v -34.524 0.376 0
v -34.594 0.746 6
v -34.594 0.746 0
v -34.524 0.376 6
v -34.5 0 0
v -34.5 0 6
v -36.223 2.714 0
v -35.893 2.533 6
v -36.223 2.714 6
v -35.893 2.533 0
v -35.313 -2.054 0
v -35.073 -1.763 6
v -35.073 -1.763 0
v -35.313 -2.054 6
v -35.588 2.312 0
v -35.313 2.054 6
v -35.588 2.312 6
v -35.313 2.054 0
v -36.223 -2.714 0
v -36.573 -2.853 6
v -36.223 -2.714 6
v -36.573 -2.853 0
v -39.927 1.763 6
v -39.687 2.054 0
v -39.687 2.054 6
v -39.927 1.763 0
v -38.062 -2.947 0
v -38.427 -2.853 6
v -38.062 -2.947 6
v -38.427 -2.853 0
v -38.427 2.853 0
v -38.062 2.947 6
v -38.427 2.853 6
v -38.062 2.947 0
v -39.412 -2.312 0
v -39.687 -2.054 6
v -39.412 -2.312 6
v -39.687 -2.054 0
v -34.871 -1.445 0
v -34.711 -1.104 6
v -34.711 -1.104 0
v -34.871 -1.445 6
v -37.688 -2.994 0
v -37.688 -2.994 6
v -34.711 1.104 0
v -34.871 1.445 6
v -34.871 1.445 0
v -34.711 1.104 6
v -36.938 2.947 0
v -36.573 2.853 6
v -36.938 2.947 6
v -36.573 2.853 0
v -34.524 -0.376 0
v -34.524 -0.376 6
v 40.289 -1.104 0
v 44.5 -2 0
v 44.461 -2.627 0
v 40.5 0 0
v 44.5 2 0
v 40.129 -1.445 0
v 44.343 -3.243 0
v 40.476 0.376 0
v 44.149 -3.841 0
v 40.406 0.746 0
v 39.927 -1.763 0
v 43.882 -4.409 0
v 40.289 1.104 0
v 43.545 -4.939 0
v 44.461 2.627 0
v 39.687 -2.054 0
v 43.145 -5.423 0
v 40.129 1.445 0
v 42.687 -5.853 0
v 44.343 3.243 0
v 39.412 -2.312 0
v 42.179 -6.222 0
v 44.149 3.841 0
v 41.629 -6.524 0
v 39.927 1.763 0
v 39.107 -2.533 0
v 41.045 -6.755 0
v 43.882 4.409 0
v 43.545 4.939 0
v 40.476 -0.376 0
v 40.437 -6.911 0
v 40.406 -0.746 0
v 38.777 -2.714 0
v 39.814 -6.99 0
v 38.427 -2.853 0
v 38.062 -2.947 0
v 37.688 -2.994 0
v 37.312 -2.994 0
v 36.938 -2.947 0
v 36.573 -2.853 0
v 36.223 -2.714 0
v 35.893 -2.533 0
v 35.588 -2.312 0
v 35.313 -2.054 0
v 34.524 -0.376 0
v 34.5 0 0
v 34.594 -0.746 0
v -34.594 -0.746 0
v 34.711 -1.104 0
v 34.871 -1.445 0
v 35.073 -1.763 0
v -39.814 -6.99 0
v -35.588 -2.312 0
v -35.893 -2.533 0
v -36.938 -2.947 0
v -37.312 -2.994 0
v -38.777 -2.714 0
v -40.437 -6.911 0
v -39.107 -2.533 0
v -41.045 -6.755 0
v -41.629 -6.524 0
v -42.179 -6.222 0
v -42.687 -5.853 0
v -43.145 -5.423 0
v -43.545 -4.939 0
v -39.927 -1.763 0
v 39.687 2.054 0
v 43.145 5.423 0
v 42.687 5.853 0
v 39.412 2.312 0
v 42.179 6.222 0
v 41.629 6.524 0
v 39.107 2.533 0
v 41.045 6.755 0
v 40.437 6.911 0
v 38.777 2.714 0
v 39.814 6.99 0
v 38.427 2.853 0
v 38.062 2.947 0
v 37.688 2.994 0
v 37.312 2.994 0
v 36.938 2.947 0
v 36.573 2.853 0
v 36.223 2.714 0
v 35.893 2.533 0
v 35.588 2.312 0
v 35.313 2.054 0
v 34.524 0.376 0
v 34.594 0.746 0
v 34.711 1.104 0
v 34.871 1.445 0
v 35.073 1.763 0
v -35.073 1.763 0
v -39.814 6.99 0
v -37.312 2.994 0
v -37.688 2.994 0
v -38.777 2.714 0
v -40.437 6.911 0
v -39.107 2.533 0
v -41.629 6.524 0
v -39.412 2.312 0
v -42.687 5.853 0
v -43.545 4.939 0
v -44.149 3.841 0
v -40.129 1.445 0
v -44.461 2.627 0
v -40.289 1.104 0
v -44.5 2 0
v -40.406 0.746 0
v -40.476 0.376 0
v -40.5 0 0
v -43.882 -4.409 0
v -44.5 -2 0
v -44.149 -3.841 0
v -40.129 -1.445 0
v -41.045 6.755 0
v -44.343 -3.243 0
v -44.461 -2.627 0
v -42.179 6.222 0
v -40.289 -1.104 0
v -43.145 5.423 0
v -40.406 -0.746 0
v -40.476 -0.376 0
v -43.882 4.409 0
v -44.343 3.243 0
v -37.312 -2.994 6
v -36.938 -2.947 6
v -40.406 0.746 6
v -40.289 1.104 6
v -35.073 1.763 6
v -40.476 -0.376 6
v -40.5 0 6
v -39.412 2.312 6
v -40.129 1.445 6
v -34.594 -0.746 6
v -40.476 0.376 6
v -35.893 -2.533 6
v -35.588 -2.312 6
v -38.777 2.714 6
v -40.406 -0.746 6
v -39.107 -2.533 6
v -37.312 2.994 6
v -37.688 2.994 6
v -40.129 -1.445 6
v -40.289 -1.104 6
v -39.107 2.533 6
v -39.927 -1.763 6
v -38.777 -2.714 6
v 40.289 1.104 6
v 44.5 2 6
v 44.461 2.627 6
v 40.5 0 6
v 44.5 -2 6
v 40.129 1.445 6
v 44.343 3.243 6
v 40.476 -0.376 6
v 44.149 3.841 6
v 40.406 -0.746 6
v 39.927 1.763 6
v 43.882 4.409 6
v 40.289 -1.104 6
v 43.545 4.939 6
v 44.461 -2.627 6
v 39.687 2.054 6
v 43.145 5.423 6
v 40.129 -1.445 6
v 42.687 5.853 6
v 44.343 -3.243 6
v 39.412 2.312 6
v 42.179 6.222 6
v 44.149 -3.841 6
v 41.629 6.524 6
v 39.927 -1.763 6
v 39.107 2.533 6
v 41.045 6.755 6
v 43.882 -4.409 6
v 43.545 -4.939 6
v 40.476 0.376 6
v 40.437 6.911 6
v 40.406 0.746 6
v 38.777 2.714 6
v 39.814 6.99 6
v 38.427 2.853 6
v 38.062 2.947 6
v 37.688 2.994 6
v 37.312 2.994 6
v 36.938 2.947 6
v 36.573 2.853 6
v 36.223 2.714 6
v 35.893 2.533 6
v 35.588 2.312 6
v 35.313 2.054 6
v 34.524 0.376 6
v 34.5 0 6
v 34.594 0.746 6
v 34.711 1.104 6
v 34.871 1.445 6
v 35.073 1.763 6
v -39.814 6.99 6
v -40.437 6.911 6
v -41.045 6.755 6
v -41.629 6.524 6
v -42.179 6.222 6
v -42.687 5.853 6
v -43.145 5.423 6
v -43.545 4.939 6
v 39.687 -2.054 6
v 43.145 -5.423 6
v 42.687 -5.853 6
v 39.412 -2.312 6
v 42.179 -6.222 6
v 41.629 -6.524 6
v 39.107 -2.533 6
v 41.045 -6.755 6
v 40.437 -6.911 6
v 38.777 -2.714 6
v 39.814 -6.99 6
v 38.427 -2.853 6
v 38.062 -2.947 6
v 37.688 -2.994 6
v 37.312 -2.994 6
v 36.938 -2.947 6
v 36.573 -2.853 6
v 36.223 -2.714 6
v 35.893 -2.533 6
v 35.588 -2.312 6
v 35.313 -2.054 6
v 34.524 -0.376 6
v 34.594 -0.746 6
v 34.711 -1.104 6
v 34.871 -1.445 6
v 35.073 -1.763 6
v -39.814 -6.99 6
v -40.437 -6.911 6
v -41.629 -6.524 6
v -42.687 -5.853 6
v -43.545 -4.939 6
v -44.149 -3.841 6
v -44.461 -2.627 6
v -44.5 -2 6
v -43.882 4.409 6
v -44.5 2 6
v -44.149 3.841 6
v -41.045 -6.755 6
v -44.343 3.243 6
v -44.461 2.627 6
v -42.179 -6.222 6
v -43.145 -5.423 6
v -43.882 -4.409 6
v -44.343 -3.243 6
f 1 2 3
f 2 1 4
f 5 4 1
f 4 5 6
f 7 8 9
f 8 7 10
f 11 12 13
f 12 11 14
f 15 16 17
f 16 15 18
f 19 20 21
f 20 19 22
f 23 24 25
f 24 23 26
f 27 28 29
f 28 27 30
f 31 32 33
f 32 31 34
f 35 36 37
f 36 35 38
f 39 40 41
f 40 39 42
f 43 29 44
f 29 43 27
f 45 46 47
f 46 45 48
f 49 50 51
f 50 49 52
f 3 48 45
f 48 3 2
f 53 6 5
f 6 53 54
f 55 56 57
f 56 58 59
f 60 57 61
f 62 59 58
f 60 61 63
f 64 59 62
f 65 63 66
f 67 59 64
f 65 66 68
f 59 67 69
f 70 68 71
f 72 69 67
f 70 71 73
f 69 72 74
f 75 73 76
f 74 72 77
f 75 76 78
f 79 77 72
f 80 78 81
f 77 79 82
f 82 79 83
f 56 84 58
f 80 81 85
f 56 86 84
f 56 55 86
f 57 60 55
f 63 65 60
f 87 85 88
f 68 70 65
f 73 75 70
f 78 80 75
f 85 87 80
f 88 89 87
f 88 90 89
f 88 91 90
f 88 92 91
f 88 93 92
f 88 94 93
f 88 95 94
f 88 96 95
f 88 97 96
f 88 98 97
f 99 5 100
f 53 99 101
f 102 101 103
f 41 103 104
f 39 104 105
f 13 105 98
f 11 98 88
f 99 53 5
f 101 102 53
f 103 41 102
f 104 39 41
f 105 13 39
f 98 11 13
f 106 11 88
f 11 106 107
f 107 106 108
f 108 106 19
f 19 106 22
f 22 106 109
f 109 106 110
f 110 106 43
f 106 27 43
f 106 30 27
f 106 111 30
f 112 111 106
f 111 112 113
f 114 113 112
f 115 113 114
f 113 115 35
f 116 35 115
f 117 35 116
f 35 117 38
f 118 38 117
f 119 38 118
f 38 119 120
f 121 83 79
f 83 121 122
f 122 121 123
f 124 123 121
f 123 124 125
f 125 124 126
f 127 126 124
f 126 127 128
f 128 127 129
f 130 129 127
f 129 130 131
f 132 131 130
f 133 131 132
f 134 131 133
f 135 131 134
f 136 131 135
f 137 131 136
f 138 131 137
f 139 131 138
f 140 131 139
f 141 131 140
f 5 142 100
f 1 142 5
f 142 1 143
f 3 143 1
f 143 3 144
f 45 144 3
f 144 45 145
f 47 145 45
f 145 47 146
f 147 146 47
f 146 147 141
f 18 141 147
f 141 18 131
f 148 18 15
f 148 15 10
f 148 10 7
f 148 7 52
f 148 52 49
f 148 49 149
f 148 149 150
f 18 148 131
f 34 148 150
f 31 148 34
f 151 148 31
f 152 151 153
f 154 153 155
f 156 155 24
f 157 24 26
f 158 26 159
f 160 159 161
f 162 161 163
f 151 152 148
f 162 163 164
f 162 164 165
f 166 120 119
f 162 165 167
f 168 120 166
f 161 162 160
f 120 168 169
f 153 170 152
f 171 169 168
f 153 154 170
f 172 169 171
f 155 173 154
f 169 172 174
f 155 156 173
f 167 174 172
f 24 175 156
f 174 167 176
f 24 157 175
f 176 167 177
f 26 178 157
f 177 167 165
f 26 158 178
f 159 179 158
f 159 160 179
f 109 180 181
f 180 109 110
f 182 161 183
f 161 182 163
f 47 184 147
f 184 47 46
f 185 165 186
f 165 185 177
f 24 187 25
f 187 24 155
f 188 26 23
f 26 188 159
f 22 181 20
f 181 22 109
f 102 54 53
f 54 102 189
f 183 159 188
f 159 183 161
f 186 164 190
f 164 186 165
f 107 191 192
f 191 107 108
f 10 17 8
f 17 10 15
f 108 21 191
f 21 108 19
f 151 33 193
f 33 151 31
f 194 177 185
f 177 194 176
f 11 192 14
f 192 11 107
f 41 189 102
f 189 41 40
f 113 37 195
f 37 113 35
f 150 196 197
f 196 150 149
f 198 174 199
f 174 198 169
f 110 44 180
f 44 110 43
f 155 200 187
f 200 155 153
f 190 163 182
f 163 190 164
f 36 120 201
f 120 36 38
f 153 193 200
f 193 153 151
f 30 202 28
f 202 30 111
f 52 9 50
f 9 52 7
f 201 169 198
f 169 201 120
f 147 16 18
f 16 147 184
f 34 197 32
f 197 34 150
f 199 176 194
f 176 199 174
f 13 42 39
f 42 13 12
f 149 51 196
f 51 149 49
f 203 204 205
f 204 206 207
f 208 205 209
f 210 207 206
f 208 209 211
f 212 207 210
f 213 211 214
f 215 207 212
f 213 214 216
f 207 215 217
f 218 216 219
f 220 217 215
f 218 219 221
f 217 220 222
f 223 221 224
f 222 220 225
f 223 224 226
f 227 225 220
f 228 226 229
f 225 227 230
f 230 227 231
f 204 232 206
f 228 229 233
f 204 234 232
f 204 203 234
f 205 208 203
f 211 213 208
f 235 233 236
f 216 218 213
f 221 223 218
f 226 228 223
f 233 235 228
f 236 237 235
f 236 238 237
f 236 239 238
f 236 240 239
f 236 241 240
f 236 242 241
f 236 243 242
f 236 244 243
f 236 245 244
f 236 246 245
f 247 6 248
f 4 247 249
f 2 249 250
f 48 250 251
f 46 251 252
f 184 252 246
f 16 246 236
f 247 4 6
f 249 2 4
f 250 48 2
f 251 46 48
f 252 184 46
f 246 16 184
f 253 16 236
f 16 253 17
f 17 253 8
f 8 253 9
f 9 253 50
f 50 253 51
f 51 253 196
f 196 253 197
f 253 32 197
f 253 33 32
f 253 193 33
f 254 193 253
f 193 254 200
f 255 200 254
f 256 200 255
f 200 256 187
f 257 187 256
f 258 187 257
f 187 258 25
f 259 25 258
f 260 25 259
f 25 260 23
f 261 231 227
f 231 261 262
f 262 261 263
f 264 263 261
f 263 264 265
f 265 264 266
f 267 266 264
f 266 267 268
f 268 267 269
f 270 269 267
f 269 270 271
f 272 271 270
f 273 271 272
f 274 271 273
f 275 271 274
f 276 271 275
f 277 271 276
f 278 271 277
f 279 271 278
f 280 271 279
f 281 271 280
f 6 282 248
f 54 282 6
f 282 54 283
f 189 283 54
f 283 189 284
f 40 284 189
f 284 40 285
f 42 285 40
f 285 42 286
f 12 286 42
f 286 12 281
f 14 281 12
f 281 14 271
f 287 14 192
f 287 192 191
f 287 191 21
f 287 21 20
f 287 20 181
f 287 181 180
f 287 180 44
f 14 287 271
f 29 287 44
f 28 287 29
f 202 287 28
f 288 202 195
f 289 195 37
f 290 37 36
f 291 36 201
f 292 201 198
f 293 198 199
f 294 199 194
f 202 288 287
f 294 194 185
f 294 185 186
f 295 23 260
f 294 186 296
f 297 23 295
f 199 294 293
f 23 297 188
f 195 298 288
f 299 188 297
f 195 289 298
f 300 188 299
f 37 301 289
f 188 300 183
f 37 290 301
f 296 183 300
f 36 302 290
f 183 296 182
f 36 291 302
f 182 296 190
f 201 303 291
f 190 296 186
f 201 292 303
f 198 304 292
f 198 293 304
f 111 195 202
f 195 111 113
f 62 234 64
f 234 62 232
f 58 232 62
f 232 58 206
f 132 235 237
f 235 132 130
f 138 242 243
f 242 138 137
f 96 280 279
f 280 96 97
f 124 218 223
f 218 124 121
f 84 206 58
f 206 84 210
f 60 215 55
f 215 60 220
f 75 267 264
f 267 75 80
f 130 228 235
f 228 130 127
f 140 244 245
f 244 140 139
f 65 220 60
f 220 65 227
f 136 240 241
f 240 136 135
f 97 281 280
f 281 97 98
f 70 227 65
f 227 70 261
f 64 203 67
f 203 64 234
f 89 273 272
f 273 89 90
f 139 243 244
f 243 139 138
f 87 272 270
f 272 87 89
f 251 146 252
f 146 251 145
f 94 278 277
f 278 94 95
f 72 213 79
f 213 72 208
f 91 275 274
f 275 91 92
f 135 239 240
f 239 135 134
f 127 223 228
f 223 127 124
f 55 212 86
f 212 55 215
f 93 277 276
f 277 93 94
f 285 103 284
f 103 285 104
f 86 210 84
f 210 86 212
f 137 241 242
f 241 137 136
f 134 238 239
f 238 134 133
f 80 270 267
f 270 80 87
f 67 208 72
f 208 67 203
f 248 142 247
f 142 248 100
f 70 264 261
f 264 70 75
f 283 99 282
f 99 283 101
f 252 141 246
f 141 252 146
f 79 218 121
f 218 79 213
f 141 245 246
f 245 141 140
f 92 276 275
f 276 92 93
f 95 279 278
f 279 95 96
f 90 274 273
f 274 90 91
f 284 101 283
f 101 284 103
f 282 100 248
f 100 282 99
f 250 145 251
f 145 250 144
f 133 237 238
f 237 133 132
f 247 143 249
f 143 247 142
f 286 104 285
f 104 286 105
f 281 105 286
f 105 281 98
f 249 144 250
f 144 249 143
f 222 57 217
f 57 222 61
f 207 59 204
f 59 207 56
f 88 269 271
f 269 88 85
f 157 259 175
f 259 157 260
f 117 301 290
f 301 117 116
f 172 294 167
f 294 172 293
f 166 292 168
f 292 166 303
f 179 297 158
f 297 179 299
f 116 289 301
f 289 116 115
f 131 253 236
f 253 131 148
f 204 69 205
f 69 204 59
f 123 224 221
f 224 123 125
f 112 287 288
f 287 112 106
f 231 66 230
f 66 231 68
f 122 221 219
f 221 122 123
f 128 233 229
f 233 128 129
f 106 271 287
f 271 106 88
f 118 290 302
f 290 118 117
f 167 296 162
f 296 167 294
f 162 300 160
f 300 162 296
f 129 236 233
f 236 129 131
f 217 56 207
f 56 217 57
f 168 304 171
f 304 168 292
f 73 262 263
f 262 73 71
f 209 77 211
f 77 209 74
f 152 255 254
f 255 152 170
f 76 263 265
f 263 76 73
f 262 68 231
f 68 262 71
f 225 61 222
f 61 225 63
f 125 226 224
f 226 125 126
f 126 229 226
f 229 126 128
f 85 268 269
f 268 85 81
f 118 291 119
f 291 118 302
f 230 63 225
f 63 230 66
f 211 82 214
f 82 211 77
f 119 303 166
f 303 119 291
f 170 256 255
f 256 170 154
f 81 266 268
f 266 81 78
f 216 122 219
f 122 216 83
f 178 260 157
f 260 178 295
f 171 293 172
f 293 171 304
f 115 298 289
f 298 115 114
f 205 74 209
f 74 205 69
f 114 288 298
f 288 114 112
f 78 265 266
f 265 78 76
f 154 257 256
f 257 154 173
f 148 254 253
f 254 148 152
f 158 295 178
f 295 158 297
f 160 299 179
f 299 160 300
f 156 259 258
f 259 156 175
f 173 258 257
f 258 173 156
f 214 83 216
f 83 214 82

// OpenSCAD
$fn = 50;


difference() {
	union() {
		hull() {
			translate(v = [-39.5000000000, 2.0000000000, 0]) {
				cylinder(h = 6, r = 5);
			}
			translate(v = [39.5000000000, 2.0000000000, 0]) {
				cylinder(h = 6, r = 5);
			}
			translate(v = [-39.5000000000, -2.0000000000, 0]) {
				cylinder(h = 6, r = 5);
			}
			translate(v = [39.5000000000, -2.0000000000, 0]) {
				cylinder(h = 6, r = 5);
			}
		}
	}
	union() {
		translate(v = [-37.5000000000, 0.0000000000, 0]) {
			cylinder(h = 6, r = 3.0000000000);
		}
		translate(v = [37.5000000000, 0.0000000000, 0]) {
			cylinder(h = 6, r = 3.0000000000);
		}
		translate(v = [-37.5000000000, 0.0000000000, 0]) {
			cylinder(h = 6, r = 1.5000000000);
		}
		translate(v = [37.5000000000, 0.0000000000, 0]) {
			cylinder(h = 6, r = 1.5000000000);
		}
		translate(v = [-37.5000000000, 0.0000000000, 0]) {
			cylinder(h = 6, r = 1.5000000000);
		}
		translate(v = [37.5000000000, 0.0000000000, 0]) {
			cylinder(h = 6, r = 1.5000000000);
		}
		translate(v = [-37.5000000000, 0.0000000000, 0]) {
			cylinder(h = 6, r = 1.5000000000);
		}
		translate(v = [37.5000000000, 0.0000000000, 0]) {
			cylinder(h = 6, r = 1.5000000000);
		}
	}
}
